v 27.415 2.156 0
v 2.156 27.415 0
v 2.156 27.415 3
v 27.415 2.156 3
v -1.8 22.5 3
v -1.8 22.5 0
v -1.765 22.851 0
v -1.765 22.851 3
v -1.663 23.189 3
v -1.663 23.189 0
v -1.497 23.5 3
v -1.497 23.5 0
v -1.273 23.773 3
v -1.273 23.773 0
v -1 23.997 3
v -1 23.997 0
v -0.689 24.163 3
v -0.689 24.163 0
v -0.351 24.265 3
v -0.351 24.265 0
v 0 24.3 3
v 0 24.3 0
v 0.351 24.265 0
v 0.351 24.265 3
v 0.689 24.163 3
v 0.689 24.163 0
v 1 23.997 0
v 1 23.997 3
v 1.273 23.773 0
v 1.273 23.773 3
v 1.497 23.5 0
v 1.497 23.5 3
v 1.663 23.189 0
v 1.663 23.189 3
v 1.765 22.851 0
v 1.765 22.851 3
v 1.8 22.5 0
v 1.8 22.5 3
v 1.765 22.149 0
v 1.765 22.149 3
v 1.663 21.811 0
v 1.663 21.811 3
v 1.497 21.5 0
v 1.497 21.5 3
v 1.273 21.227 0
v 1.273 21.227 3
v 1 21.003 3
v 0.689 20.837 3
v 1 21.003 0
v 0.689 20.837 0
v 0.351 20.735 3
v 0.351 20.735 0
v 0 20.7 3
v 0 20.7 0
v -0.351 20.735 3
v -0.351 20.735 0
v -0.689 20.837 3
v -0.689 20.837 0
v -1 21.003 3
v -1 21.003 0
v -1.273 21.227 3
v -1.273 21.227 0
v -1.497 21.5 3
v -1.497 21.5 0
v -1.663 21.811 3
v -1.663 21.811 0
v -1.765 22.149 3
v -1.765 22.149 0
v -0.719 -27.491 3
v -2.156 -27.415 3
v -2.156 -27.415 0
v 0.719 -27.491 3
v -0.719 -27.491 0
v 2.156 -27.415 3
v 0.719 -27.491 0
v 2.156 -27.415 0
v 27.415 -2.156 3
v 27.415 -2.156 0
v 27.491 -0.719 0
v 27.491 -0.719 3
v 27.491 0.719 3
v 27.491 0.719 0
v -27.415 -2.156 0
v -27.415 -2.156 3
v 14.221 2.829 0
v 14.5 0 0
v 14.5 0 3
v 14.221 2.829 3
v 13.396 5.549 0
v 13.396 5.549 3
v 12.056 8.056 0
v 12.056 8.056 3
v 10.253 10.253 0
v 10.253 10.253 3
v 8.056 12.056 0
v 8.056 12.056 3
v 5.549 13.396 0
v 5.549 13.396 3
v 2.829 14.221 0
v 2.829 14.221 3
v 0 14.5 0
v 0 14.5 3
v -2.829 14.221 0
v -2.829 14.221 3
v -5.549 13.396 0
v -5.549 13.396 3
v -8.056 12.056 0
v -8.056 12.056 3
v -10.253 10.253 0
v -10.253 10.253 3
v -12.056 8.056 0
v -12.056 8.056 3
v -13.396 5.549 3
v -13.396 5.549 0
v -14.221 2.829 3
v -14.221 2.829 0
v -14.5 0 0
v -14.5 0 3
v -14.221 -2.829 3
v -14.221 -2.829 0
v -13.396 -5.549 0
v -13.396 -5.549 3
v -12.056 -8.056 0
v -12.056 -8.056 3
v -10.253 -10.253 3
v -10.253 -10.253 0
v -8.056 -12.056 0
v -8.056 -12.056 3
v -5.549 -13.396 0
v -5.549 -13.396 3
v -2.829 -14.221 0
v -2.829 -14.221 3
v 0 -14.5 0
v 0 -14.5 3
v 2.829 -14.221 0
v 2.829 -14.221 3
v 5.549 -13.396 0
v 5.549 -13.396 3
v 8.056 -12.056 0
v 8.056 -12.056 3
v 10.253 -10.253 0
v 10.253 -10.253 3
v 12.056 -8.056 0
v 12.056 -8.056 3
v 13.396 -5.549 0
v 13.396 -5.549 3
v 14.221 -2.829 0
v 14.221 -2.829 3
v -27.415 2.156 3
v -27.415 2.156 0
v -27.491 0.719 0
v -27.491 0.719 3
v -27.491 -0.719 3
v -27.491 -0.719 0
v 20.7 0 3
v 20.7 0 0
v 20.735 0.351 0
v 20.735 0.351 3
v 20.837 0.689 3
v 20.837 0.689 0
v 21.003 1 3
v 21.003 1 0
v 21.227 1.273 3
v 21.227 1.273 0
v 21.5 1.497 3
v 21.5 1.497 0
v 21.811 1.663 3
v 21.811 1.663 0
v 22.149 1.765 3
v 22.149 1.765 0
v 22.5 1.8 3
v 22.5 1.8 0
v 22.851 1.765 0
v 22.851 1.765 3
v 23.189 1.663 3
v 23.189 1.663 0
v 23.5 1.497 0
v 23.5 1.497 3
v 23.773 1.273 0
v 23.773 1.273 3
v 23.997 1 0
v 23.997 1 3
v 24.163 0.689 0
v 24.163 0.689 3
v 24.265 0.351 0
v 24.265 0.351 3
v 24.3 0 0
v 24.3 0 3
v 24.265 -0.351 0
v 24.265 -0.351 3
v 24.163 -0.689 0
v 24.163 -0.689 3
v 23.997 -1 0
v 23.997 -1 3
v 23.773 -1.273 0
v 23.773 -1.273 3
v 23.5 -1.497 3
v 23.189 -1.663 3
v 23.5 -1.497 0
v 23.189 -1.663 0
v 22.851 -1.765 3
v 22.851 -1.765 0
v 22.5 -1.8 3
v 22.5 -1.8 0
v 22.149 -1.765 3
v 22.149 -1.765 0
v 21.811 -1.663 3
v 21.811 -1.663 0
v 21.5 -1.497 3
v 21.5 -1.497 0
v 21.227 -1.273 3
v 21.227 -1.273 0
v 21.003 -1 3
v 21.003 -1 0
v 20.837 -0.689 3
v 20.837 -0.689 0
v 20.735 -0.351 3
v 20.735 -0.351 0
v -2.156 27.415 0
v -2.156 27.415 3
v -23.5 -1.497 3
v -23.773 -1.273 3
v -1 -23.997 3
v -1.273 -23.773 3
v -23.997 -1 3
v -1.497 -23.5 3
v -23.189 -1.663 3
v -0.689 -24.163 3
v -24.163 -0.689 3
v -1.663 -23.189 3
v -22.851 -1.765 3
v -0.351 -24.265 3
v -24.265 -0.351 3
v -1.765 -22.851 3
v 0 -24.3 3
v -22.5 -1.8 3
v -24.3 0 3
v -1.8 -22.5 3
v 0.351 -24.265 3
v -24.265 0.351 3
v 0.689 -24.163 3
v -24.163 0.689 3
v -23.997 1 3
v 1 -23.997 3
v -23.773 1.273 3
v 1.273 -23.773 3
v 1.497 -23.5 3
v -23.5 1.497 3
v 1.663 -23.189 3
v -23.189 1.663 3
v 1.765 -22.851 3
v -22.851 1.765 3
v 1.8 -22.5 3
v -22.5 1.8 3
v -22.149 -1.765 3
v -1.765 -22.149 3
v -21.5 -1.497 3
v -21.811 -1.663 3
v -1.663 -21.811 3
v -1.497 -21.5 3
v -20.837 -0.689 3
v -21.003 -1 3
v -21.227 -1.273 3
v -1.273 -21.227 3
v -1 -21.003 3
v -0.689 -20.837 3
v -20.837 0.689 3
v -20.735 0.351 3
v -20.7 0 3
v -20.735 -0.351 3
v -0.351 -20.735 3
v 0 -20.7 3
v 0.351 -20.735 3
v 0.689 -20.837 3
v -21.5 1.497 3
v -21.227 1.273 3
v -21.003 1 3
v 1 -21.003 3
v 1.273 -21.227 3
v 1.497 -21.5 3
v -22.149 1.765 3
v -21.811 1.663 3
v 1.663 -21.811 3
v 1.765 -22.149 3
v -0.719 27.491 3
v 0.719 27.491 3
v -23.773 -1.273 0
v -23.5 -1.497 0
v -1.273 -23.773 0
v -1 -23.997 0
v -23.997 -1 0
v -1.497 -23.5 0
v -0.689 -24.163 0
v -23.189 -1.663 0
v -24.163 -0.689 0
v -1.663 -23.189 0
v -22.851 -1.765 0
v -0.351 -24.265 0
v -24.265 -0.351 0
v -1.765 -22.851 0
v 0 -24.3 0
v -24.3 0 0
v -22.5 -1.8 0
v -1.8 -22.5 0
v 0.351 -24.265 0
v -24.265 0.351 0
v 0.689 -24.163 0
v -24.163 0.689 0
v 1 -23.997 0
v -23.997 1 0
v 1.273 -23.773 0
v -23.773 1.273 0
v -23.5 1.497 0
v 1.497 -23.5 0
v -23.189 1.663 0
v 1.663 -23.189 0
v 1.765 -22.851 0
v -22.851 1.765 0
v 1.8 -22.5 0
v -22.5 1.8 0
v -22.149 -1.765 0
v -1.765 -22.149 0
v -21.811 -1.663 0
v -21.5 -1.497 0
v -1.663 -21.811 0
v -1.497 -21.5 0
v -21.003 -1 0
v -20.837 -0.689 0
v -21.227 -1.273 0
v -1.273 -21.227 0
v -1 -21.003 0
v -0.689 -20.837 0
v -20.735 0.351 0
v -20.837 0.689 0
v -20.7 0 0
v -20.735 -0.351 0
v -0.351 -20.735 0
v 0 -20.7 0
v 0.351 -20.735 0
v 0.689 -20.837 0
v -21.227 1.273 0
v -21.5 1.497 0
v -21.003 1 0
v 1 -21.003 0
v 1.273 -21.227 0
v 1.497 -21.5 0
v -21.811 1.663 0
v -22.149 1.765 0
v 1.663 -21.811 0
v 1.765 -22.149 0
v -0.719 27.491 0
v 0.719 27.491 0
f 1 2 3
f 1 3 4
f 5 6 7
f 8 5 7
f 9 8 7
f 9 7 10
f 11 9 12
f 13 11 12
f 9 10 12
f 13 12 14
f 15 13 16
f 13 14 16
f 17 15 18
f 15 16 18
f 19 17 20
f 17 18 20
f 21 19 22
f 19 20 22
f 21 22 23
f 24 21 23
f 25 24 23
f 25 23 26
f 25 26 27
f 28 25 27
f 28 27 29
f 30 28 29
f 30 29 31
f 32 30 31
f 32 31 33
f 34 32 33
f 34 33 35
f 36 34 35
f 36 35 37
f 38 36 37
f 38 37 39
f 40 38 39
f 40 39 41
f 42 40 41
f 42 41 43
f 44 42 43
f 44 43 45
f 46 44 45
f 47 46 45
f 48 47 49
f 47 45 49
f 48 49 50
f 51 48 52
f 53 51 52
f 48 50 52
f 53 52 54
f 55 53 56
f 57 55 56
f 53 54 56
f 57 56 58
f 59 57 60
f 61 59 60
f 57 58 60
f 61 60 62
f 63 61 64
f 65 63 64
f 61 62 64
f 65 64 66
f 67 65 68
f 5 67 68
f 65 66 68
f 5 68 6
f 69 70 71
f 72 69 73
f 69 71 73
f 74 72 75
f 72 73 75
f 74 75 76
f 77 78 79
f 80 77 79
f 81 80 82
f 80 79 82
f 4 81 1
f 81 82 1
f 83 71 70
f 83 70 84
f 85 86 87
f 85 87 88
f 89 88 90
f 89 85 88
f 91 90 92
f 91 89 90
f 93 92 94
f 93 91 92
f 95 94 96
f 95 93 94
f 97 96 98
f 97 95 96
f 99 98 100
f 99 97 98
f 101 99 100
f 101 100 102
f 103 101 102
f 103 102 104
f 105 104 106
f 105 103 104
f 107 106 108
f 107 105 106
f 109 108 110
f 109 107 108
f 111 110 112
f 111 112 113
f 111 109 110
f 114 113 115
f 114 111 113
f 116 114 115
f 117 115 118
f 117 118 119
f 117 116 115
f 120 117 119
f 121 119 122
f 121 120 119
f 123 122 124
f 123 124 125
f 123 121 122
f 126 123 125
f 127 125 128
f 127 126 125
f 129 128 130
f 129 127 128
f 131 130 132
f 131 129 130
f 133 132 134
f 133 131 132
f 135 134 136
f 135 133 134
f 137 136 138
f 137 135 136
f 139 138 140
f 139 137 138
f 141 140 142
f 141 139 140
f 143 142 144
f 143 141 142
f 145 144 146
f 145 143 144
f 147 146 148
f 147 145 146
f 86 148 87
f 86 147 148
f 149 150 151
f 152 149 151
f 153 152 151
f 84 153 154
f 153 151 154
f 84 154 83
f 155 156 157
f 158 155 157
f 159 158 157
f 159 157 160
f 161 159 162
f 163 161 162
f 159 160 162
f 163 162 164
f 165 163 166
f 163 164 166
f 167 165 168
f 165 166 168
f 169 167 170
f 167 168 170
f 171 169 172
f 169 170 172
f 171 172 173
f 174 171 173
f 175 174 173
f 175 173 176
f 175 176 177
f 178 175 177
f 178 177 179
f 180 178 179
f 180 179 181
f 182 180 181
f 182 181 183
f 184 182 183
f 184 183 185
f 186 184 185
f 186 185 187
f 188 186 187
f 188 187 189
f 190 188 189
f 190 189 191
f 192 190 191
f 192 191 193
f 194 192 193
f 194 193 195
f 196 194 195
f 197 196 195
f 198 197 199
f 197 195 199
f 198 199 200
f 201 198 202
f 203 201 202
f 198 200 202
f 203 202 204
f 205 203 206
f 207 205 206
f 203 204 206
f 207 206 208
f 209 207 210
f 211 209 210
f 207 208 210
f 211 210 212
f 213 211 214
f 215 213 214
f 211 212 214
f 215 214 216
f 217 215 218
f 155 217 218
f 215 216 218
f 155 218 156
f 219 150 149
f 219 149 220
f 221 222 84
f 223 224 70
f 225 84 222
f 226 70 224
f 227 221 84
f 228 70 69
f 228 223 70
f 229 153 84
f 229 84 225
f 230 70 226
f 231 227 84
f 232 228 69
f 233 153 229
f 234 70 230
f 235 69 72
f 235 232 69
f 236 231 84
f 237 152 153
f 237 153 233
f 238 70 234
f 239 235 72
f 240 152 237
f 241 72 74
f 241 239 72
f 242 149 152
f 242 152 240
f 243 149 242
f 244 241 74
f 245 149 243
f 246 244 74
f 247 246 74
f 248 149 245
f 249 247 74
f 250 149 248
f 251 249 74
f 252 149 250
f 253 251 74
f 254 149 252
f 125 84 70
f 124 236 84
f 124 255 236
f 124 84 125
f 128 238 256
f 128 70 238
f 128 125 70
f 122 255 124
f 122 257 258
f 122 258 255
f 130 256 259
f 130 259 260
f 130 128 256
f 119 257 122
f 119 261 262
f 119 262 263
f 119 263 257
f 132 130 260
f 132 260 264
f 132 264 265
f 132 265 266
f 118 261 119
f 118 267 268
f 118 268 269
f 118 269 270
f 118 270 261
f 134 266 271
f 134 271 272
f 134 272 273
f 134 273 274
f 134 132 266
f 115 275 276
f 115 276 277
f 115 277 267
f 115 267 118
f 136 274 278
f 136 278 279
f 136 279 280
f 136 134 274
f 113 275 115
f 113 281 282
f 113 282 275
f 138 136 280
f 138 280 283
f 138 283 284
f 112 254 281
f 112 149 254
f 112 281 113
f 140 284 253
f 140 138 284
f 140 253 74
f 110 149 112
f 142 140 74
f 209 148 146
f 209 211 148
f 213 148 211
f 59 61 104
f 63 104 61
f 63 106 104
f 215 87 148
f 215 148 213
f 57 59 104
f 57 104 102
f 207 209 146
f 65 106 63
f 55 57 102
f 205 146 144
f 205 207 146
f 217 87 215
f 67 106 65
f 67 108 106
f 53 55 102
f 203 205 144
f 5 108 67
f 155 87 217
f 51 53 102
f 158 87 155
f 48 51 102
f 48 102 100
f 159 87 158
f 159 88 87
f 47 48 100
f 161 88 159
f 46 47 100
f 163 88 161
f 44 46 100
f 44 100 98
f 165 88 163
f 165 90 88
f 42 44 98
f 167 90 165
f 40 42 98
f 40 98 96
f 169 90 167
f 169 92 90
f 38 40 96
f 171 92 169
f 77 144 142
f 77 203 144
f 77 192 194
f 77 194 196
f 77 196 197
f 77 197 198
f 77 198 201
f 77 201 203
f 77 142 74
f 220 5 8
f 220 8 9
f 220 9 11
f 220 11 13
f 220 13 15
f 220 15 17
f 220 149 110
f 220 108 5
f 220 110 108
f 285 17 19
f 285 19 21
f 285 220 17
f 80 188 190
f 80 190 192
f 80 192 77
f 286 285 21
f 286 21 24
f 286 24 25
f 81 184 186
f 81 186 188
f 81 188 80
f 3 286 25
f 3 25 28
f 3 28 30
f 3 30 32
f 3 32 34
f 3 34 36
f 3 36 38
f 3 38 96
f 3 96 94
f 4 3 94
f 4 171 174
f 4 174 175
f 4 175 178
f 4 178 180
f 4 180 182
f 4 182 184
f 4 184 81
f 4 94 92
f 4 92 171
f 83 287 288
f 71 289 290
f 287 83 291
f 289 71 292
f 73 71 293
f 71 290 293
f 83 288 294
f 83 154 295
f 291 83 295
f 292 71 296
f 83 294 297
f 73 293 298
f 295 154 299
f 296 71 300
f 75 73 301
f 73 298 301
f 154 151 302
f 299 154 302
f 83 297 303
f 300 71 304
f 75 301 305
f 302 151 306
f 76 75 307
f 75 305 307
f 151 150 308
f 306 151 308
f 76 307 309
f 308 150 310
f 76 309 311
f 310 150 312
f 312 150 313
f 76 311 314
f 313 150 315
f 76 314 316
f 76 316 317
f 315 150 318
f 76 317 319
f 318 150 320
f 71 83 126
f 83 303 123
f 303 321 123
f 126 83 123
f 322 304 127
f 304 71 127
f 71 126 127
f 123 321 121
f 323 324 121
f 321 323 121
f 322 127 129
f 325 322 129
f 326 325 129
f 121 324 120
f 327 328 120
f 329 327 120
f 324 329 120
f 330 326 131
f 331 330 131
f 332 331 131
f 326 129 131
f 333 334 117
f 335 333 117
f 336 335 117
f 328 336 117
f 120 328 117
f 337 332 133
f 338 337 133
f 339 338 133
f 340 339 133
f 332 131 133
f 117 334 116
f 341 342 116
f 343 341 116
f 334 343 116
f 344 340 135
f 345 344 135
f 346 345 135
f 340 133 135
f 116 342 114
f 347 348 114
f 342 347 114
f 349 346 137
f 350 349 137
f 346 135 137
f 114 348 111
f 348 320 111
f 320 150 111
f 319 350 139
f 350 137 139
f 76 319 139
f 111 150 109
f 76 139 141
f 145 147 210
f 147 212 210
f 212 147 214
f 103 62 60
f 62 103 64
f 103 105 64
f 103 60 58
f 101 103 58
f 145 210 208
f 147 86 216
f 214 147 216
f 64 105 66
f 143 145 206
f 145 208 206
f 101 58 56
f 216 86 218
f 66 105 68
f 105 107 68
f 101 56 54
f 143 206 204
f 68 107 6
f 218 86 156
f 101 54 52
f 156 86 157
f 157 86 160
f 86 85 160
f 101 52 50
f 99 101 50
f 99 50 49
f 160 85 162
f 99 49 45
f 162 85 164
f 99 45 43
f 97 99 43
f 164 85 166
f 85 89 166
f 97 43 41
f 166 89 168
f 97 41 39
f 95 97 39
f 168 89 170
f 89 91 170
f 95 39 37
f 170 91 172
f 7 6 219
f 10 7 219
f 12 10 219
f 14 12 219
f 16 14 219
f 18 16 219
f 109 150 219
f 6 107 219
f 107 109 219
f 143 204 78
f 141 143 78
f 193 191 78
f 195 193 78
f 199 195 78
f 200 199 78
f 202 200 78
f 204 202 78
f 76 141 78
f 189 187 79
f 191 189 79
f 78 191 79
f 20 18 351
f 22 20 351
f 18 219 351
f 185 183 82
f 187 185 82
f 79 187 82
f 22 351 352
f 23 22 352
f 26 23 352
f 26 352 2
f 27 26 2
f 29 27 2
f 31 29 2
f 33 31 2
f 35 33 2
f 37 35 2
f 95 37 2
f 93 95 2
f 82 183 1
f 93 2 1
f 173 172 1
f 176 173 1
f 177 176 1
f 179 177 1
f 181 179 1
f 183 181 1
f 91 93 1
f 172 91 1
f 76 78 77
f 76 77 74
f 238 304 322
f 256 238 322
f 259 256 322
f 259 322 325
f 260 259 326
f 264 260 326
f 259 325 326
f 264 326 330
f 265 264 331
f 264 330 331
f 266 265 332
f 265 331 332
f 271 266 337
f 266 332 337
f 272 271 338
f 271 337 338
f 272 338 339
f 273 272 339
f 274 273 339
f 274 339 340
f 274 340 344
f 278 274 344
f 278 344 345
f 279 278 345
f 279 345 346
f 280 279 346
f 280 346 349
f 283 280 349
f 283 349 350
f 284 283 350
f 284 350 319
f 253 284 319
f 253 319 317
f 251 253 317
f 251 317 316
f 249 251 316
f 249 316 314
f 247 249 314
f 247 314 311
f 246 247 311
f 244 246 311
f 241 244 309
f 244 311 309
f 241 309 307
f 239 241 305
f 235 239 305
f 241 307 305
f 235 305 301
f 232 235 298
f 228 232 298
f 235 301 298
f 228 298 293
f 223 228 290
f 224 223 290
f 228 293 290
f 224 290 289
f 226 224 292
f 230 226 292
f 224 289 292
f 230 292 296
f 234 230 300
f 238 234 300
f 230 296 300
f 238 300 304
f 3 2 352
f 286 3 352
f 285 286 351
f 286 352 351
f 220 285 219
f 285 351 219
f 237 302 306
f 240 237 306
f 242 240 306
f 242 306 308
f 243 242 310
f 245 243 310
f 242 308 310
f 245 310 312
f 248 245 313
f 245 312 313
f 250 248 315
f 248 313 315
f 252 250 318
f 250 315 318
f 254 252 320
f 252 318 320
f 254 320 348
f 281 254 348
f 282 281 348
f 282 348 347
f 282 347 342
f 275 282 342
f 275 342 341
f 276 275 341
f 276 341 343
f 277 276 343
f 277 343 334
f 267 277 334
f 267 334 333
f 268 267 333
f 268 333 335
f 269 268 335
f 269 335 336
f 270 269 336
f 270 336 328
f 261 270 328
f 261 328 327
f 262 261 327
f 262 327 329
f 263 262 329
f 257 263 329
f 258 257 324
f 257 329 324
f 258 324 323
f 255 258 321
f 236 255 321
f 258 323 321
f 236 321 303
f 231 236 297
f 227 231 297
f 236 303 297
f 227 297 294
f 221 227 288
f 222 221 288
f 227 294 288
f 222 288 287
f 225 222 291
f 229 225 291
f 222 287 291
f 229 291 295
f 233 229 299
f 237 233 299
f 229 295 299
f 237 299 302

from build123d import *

# Parameters (mm, degrees)
SKETCH1_R            = 27.5
SKETCH1_R_2          = 14.5
SKETCH1_R_3          = 1.5
BOSS_EXTRUDE1_DEPTH  = 3
CUT_EXTRUDE1_START   = -10
CUT_EXTRUDE1_DEPTH   = 10
M3_CLEARANCE_HOLE1_D = 3.6


with BuildPart() as part:
    # Sketch1 → Boss-Extrude1 (new body)
    with BuildSketch(Plane.XY):
        Circle(SKETCH1_R)
        Circle(SKETCH1_R_2, mode=Mode.SUBTRACT)
        with Locations((0, 22.5)):
            Circle(SKETCH1_R_3, mode=Mode.SUBTRACT)
        with Locations((22.5, 0)):
            Circle(SKETCH1_R_3, mode=Mode.SUBTRACT)
        with Locations((0, -22.5)):
            Circle(SKETCH1_R_3, mode=Mode.SUBTRACT)
        with Locations((-22.5, 0)):
            Circle(SKETCH1_R_3, mode=Mode.SUBTRACT)
    extrude(amount=BOSS_EXTRUDE1_DEPTH)

    # Sketch2 → Cut-Extrude1 (cut)
    with BuildSketch(Plane.XY.offset(3).offset(CUT_EXTRUDE1_START)):
        with BuildLine():
            ThreePointArc((-2.155688811, 27.415379001), (-19.445436483, 19.445436483), (-27.415379001, 2.155688811))
            Line((-27.415379001, 2.155688811), (-2.155688811, 27.415379001))
        make_face()
        with BuildLine():
            ThreePointArc((27.415379001, 2.155688811), (19.445436483, 19.445436483), (2.155688811, 27.415379001))
            Line((2.155688811, 27.415379001), (27.415379001, 2.155688811))
        make_face()
        with BuildLine():
            Line((27.415379001, -2.155688811), (2.155688811, -27.415379001))
            ThreePointArc((2.155688811, -27.415379001), (19.445436483, -19.445436483), (27.415379001, -2.155688811))
        make_face()
        with BuildLine():
            Line((-2.155688811, -27.415379001), (-27.415379001, -2.155688811))
            ThreePointArc((-27.415379001, -2.155688811), (-19.445436483, -19.445436483), (-2.155688811, -27.415379001))
        make_face()
    extrude(amount=CUT_EXTRUDE1_DEPTH, mode=Mode.SUBTRACT)

    # M3 Clearance Hole1 (through all)
    with Locations(Plane.XY.offset(3)):
        with Locations((0, 22.5), (-22.5, 0), (0, -22.5), (22.5, 0)):
            Hole(M3_CLEARANCE_HOLE1_D / 2)


solid = part.part
